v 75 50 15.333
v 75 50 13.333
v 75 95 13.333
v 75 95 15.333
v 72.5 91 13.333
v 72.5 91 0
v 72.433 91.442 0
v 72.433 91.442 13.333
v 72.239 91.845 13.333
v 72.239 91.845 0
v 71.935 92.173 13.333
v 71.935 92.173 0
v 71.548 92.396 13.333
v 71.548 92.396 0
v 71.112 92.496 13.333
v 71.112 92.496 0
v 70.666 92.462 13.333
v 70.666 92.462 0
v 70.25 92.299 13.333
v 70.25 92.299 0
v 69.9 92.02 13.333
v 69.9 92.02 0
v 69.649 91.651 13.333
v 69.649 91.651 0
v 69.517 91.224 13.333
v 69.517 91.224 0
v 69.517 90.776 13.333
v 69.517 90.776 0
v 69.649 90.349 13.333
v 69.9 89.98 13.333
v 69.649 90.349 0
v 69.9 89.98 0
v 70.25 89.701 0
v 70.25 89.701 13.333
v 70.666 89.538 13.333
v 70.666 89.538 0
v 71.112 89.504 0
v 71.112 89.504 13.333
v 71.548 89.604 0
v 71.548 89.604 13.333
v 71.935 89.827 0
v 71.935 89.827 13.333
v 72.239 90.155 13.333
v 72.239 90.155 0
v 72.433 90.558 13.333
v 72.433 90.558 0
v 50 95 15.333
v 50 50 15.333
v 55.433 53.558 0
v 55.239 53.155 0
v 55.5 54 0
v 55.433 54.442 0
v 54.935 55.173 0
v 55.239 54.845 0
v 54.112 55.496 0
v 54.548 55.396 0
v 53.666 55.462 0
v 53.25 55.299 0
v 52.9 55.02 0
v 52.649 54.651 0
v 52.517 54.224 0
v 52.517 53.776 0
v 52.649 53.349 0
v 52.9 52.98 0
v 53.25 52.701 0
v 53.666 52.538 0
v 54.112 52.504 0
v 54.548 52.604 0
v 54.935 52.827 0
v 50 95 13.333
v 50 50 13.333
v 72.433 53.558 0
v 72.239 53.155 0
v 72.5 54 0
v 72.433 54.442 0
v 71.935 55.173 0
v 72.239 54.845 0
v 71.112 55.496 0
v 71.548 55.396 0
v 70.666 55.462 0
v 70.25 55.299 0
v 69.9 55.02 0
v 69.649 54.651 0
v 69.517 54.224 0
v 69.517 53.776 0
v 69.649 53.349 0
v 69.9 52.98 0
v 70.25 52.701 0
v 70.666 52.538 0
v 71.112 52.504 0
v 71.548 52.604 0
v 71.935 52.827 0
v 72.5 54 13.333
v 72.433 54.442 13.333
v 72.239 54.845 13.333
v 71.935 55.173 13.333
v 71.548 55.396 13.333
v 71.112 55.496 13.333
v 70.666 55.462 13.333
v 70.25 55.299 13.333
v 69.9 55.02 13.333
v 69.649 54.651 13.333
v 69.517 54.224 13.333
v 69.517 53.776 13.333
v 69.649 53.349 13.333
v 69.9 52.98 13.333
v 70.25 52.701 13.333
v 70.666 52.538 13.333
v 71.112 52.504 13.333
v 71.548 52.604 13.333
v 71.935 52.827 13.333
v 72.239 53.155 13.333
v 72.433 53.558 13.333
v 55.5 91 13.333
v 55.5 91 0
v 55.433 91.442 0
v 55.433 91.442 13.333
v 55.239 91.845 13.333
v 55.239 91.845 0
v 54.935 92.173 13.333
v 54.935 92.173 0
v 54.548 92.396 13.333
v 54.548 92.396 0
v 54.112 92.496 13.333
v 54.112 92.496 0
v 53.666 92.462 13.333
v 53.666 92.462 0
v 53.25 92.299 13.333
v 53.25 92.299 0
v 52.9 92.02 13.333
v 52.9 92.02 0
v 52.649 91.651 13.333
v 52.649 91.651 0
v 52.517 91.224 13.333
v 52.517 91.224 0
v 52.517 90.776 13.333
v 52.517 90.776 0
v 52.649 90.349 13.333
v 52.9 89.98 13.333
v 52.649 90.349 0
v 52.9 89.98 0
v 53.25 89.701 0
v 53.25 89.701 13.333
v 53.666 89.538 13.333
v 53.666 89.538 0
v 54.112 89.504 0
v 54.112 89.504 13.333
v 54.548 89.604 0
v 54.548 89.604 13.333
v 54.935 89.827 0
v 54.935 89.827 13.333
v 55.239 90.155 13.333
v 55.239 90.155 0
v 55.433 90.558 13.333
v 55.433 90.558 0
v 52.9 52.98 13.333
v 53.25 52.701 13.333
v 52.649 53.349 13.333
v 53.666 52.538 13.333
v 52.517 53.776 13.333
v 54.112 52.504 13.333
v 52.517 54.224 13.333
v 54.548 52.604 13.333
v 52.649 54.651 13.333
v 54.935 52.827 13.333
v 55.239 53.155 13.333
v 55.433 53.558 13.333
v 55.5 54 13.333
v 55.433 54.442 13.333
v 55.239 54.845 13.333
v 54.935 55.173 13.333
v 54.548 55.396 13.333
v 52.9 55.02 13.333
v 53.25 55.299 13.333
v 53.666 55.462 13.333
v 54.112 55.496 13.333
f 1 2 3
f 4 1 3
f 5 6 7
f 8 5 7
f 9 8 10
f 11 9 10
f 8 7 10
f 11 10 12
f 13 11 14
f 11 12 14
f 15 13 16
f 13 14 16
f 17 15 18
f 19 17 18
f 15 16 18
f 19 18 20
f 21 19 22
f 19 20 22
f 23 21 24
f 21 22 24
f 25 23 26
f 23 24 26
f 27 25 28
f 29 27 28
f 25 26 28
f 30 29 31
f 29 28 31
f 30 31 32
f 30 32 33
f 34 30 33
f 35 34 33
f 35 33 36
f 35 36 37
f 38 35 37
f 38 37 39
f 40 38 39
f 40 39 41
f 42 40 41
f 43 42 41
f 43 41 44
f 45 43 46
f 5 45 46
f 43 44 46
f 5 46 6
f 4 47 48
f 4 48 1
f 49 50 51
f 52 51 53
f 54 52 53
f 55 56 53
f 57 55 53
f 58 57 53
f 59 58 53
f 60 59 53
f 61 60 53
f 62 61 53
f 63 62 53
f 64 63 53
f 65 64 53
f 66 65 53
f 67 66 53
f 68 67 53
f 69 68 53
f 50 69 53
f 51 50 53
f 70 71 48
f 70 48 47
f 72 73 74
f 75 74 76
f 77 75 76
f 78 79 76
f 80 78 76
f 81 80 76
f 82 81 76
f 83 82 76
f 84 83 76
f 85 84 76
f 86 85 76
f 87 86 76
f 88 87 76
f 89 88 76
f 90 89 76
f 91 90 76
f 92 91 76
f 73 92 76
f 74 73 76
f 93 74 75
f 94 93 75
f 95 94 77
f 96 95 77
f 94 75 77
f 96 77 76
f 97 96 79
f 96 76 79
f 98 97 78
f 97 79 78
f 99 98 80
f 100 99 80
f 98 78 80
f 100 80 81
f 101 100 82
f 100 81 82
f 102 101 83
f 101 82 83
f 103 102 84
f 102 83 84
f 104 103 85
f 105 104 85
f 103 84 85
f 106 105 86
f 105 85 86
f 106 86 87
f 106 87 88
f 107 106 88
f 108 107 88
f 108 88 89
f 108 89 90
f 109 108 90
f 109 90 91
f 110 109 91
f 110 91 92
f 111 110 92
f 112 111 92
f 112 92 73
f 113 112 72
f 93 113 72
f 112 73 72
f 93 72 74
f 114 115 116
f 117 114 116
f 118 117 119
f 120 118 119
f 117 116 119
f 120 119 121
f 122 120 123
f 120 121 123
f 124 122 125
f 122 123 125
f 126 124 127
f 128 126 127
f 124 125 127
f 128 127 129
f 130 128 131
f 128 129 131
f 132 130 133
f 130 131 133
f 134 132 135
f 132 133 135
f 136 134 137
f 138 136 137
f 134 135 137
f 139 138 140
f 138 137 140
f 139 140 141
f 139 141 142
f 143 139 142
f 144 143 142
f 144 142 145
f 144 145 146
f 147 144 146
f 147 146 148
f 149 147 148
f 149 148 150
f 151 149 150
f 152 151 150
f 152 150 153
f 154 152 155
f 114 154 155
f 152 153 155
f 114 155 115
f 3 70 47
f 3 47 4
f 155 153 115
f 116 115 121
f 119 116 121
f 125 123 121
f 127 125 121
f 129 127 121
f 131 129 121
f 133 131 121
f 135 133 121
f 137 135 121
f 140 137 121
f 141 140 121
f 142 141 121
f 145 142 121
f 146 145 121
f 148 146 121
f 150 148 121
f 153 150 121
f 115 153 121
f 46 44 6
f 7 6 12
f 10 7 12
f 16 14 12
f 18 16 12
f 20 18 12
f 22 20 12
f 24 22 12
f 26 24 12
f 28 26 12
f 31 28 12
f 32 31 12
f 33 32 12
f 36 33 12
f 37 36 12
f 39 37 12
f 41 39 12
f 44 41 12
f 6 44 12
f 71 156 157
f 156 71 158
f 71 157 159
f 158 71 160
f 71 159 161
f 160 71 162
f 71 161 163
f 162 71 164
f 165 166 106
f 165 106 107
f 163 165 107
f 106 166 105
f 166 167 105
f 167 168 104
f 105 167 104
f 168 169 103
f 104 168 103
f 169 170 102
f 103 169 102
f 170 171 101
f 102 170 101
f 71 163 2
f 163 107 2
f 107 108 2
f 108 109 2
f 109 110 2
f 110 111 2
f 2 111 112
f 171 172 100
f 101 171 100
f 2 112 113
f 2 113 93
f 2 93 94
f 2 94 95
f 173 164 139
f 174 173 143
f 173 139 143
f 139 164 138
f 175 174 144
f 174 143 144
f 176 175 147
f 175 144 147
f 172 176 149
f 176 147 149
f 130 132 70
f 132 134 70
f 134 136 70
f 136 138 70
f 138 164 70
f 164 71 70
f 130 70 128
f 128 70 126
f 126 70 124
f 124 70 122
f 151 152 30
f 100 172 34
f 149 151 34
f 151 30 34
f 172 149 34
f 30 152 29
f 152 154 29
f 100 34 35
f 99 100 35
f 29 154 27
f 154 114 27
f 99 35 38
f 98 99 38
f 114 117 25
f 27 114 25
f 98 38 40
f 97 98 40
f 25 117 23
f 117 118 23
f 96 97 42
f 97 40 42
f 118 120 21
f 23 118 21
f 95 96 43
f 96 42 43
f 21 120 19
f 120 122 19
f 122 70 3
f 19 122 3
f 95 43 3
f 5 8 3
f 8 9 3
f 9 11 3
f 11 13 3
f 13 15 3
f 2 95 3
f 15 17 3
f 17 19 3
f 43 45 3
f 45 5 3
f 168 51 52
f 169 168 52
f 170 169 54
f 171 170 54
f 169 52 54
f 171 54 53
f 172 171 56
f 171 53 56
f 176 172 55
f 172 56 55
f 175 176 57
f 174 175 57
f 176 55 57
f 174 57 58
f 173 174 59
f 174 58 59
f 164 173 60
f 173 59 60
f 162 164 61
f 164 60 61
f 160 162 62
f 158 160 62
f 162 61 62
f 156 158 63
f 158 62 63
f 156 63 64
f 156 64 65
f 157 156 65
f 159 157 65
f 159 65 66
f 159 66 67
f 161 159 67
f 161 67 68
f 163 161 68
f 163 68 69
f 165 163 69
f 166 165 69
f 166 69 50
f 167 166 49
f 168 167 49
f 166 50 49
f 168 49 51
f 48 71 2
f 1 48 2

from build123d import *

# Parameters (mm, degrees)
CYLINDER_R         = 1.5
CYLINDER_DEPTH     = 13.3333
ARRAY_X_COUNT      = 2
ARRAY_X_PITCH      = 17
ARRAY_Y_COUNT      = 2
ARRAY_Y_PITCH      = 37
BOX021003019_W     = 25
BOX021003019_H     = 45
BOX021003019_DEPTH = 2


with BuildPart() as matriz_4_patas_mesa_sofa:
    # Cylinder → Cylinder (new body)
    with BuildSketch(Plane(origin=(54, 54, 0), x_dir=(1, 0, 0), z_dir=(0, 0, 1))):
        Circle(CYLINDER_R)
    extrude(amount=CYLINDER_DEPTH)

    # Array X: matriz 4 patas mesa sofa ×2


with BuildPart() as matriz_4_patas_mesa_sofa_1:
    add(matriz_4_patas_mesa_sofa.part)
    with Locations(*[(i * ARRAY_X_PITCH, 0, 0) for i in range(1, ARRAY_X_COUNT)]):
        add(matriz_4_patas_mesa_sofa.part)

    # Array Y: matriz 4 patas mesa sofa ×2


with BuildPart() as matriz_4_patas_mesa_sofa_2:
    add(matriz_4_patas_mesa_sofa_1.part)
    with Locations(*[(0, i * ARRAY_Y_PITCH, 0) for i in range(1, ARRAY_Y_COUNT)]):
        add(matriz_4_patas_mesa_sofa_1.part)


with BuildPart() as mesa_sofa:
    # Box021003019 → Box021003019 (new body)
    with BuildSketch(Plane(origin=(50, 50, 13.3333), x_dir=(1, 0, 0), z_dir=(0, 0, 1))):
        with Locations((12.5, 22.5)):
            Rectangle(BOX021003019_W, BOX021003019_H)
    extrude(amount=BOX021003019_DEPTH)

    # Fusion009: union matriz 4 patas mesa sofa
    add(matriz_4_patas_mesa_sofa_2.part)


solid = mesa_sofa.part
